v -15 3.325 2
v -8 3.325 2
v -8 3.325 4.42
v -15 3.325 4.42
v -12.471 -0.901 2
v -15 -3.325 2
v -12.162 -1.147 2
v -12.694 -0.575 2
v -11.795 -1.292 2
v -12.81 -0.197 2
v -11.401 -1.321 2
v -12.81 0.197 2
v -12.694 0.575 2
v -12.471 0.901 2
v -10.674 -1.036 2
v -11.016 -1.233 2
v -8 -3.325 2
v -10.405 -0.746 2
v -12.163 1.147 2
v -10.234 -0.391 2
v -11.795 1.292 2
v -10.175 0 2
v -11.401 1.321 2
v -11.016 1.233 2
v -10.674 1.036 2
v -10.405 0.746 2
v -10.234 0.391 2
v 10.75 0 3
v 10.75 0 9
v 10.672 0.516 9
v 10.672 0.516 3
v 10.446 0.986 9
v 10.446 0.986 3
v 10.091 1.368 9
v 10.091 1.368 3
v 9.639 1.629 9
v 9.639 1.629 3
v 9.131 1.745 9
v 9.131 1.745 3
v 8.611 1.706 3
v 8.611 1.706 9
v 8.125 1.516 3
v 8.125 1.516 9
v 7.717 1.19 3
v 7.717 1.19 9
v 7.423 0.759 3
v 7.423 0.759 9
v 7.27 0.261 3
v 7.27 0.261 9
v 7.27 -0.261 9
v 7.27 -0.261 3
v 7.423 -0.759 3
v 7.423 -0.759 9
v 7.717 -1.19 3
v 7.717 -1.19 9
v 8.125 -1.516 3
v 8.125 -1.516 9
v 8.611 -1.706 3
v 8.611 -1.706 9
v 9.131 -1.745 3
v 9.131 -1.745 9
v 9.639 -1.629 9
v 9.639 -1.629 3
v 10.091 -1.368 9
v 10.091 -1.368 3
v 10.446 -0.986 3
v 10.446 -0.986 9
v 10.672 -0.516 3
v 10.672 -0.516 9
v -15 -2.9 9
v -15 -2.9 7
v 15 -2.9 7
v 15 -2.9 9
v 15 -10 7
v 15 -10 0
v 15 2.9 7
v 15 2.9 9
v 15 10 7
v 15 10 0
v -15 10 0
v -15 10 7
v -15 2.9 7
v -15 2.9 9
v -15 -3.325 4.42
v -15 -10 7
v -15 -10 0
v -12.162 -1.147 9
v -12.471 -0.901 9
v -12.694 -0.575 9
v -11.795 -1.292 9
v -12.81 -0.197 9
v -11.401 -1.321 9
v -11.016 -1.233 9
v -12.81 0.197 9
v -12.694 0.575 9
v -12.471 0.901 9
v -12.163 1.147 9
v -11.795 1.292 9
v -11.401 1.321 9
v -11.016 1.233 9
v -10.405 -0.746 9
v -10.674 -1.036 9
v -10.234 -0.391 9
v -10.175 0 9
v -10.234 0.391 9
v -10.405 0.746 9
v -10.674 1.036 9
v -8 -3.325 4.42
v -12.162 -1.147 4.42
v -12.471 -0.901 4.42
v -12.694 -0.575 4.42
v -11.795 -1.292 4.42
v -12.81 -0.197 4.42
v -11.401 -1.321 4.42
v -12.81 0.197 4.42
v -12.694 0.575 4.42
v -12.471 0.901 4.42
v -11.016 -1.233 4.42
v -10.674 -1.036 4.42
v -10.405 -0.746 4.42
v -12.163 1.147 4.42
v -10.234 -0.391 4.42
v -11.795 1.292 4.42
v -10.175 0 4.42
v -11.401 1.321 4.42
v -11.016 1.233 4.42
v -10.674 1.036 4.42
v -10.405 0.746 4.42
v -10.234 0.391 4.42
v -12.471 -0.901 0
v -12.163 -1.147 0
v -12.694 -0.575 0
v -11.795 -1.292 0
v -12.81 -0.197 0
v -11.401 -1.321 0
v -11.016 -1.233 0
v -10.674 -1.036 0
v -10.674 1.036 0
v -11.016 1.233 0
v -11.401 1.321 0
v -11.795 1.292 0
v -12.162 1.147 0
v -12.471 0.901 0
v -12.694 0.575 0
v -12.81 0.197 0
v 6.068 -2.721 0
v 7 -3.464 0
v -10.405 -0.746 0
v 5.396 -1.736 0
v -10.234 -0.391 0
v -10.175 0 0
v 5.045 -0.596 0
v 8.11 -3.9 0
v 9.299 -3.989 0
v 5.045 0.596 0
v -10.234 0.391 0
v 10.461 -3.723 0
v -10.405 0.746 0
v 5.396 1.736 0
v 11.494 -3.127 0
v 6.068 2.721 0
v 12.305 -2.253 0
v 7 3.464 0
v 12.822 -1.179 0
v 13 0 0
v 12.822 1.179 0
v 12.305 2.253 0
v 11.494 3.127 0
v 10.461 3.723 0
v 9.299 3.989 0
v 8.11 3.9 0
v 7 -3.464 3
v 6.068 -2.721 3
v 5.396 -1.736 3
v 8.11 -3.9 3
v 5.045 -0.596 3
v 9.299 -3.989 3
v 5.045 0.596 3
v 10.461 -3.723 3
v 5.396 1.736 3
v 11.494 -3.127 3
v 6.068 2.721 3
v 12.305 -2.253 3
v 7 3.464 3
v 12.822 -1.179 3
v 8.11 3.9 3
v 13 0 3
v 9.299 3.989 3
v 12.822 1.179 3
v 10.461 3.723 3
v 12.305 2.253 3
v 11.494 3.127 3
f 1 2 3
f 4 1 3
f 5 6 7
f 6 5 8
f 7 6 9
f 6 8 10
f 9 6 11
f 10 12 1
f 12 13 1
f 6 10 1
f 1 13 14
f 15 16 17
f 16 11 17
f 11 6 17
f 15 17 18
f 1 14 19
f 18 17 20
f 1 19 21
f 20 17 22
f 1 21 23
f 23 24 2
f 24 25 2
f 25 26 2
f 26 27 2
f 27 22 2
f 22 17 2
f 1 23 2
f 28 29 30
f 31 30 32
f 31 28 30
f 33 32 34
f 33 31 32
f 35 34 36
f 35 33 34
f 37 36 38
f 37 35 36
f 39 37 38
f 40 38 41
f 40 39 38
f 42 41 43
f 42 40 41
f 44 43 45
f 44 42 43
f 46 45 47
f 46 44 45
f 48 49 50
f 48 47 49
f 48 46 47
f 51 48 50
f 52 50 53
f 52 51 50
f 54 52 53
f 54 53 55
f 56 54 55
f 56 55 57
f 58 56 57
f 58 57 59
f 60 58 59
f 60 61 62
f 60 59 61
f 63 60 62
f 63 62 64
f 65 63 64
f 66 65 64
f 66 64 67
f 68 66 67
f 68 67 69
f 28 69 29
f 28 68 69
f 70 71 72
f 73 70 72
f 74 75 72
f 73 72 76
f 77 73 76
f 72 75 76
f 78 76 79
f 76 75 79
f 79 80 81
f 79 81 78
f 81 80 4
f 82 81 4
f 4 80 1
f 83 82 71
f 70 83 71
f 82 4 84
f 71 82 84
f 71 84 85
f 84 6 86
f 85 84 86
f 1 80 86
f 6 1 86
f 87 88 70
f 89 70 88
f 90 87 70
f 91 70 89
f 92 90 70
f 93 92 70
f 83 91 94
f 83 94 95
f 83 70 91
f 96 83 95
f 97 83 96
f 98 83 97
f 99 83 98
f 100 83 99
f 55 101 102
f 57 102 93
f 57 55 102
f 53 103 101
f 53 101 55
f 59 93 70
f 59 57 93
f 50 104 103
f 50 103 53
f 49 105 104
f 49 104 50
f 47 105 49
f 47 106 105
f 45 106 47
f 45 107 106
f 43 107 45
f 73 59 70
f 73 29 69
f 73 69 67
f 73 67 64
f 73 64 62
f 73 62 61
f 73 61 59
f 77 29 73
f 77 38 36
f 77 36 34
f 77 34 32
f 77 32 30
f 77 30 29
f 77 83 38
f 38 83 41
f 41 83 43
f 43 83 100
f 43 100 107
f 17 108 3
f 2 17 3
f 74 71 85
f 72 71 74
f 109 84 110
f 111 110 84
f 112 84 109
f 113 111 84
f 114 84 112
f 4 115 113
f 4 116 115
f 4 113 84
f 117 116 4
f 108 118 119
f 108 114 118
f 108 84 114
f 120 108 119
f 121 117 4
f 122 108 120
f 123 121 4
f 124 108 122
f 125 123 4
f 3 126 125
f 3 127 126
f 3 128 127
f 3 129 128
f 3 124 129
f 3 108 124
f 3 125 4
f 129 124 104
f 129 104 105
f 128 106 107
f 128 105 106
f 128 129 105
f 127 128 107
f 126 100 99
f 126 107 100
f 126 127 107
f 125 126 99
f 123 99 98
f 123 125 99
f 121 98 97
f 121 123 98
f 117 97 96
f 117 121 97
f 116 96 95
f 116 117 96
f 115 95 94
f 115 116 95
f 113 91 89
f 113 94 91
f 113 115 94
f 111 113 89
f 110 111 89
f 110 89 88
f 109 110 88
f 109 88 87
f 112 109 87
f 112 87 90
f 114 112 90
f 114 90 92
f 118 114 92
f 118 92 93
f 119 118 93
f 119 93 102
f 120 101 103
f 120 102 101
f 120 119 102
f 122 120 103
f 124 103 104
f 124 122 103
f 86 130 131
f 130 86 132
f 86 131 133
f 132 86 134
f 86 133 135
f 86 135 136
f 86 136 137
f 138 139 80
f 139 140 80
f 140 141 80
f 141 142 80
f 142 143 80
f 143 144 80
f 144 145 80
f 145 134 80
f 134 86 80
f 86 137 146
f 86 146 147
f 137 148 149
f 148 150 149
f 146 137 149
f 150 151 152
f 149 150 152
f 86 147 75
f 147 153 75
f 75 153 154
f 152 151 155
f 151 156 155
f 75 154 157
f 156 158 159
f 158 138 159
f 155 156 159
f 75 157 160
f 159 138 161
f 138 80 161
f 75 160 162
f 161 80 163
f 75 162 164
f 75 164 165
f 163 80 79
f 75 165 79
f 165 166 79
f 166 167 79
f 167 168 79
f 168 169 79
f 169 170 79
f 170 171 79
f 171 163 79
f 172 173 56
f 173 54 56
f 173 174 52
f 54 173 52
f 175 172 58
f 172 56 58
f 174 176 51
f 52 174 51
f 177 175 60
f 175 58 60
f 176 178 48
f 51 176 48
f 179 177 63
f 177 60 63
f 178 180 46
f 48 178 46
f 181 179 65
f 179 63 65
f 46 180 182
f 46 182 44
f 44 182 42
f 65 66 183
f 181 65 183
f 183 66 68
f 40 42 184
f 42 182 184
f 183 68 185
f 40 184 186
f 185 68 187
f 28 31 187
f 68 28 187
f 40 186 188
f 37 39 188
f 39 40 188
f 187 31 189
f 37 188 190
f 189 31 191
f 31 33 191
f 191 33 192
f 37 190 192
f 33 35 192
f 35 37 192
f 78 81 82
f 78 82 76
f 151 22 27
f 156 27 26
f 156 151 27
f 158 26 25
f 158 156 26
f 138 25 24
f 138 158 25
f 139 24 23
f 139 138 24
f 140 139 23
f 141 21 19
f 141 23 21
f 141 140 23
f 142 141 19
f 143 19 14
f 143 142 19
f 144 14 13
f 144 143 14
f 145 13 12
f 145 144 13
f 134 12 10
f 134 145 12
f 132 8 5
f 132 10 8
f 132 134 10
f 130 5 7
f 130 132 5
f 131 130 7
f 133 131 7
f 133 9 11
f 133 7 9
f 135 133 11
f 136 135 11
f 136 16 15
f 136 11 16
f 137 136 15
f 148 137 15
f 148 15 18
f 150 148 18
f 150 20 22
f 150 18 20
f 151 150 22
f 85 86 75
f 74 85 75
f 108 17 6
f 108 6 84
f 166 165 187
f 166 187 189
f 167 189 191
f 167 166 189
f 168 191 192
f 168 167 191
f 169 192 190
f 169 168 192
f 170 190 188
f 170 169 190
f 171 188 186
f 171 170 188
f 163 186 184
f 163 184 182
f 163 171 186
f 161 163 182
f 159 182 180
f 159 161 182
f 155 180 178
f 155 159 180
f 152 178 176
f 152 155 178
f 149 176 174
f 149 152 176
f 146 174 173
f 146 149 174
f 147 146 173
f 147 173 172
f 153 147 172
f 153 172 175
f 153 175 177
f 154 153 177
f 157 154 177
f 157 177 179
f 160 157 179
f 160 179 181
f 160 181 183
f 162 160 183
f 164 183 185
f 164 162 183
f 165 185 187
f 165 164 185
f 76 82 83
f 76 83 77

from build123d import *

# Parameters (mm, degrees)
F0_W     = 30
F0_H     = 2.9
F0_H_2   = 7.1
F1_DEPTH = 7
F2_DEPTH = 9
F3_R     = 1.75
F4_DEPTH = 10
F3_R_2   = 4
F5_DEPTH = 3
F7_START = -8
F6_W     = 6.65
F6_H     = 2.42
F7_DEPTH = 7
F8_R     = 1.325
F9_DEPTH = 25


with BuildPart() as f1:
    # F0 (on Top) → F1 (new body)
    with BuildSketch(Plane.XY):
        with Locations((0, -1.45)):
            Rectangle(F0_W, F0_H)
        with Locations((0, -6.45)):
            Rectangle(F0_W, F0_H_2)
        with Locations((0, 6.45)):
            Rectangle(F0_W, F0_H_2)
        with Locations((0, 1.45)):
            Rectangle(F0_W, F0_H)
    extrude(amount=F1_DEPTH)

    # F0 (on Top) → F2 (join)
    with BuildSketch(Plane.XY):
        with Locations((0, -1.45)):
            Rectangle(F0_W, F0_H)
        with Locations((0, 1.45)):
            Rectangle(F0_W, F0_H)
    extrude(amount=F2_DEPTH)

    # F3 (on Top) → F4 (cut)
    with BuildSketch(Plane.XY):
        with Locations((9, 0)):
            Circle(F3_R)
    extrude(amount=F4_DEPTH, mode=Mode.SUBTRACT)

    # F3 (on Top) → F5 (cut)
    with BuildSketch(Plane.XY):
        with Locations((9, 0)):
            Circle(F3_R_2)
        with Locations((9, 0)):
            Circle(F3_R, mode=Mode.SUBTRACT)
    extrude(amount=F5_DEPTH, mode=Mode.SUBTRACT)

    # F6 (on Right) → F7 (cut)
    with BuildSketch(Plane.YZ.offset(F7_START)):
        with Locations((0, 3.21)):
            Rectangle(F6_W, F6_H)
    extrude(amount=-F7_DEPTH, mode=Mode.SUBTRACT)

    # F8 (on Top) → F9 (cut)
    with BuildSketch(Plane.XY):
        with Locations((-11.5, 0)):
            Circle(F8_R)
    extrude(amount=F9_DEPTH, mode=Mode.SUBTRACT)


solid = f1.part
